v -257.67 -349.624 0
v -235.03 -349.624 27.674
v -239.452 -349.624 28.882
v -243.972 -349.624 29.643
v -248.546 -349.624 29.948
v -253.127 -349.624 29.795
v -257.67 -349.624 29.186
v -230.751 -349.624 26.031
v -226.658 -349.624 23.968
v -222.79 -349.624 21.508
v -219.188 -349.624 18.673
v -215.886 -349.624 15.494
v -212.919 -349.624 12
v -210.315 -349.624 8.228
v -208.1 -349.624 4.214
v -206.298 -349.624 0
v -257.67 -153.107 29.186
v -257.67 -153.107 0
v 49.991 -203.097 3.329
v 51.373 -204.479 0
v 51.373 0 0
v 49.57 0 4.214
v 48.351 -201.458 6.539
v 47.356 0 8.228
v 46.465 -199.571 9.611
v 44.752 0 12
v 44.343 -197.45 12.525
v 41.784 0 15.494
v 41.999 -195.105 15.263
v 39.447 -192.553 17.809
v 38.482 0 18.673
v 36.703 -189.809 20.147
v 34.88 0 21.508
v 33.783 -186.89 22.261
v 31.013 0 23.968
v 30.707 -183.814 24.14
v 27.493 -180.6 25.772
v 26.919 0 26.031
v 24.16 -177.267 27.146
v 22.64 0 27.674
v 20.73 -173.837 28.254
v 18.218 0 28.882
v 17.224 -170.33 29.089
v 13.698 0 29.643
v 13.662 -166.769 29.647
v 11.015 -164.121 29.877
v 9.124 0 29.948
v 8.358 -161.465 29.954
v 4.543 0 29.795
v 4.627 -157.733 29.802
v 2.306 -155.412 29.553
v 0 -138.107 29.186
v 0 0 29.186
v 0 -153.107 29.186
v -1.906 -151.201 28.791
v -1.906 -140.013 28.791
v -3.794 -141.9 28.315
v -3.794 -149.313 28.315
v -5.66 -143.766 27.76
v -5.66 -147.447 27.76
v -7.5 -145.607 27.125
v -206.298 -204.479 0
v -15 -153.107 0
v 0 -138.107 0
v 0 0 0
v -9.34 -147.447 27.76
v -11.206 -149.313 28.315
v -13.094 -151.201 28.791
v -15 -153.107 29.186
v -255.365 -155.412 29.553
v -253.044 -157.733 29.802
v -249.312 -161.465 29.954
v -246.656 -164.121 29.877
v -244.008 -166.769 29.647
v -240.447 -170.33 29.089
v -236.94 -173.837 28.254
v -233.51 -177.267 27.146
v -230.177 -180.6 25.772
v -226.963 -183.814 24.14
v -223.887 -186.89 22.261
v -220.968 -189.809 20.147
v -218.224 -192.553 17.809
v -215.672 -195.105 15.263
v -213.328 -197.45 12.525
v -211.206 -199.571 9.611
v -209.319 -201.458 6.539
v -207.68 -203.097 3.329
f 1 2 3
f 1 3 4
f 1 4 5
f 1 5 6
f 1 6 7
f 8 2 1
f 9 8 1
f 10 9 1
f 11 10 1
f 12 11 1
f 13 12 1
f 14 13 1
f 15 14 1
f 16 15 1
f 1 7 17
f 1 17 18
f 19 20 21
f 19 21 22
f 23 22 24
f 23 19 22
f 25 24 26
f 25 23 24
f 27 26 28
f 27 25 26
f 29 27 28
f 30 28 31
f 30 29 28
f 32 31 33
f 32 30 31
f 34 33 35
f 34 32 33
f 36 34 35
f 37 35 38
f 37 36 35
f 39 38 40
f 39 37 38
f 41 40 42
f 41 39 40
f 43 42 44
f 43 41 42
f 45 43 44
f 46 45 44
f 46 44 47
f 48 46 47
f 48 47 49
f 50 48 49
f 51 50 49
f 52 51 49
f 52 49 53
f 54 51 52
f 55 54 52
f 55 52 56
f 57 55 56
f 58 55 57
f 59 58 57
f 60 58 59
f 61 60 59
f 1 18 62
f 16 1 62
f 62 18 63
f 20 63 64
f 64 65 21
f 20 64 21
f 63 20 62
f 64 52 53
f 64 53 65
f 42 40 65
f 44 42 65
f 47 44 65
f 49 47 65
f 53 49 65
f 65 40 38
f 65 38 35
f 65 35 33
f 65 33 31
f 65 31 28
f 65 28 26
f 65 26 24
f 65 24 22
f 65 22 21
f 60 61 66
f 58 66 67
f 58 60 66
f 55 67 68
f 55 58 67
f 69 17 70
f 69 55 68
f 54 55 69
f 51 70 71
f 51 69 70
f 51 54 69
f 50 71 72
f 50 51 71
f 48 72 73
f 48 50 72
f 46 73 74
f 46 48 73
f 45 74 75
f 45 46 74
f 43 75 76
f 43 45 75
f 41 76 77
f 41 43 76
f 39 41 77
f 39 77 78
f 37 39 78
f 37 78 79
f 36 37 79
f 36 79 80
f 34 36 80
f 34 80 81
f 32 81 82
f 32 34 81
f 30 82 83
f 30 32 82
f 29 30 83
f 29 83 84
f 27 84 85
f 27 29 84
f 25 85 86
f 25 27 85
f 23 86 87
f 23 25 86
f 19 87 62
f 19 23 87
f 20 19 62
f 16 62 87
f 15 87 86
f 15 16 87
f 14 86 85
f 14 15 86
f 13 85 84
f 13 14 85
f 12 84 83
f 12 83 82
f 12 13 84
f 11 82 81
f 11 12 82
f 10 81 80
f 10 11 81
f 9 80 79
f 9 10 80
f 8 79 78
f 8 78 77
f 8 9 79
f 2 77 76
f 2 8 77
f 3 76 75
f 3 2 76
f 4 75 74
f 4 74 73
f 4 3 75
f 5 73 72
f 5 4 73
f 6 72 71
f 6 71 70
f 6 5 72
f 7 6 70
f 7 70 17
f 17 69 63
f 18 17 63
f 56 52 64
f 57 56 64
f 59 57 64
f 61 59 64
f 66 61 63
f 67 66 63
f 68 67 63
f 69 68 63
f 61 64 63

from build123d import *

# Parameters (mm, degrees)
F3_T4_DEPTH  = 67.761612304
F3_S5_R      = 45.861643493
F3_T6_DEPTH  = 37
F3_S7_R      = 45.861643493
F3_T8_DEPTH  = 37
F3_T12_DEPTH = 67.761612304
F3_S13_R     = 45.861643493
F3_T14_DEPTH = 37
F3_S15_R     = 45.861643493
F3_T16_DEPTH = 37
F3_T20_DEPTH = 67.761612304
F3_S21_R     = 45.861643493
F3_T22_DEPTH = 37
F3_S23_R     = 45.861643493
F3_T24_DEPTH = 37


# Not quite as in the source:
# - a fillet or chamfer that OpenCascade refuses, or shapes differently, is made with other operations: its cross-section is extruded or revolved along the edge and cut away or added


with BuildPart() as f2:
    # F2: sweep along a path in F1
    with BuildLine(Plane.XY) as f2_path:
        Line((0, 0), (0, -153.106674552))
        Line((0, -153.106674552), (-257.6704025269, -153.106674552))
        Line((-257.6704025269, -153.106674552), (-257.6704025269, -349.6235013008))
    # F0 (on Front) → F2 (sweep)
    with BuildSketch(Plane.XZ):
        with BuildLine():
            Line((0, 0), (44.372734969, 0))
            add(Edge.make_bspline(
                [(44.372734969, 0), (44.372734969, 22.1863674845), (0, 22.1863674845)],
                knots=[3.1415926536, 3.1415926536, 3.1415926536, 4.7123889804, 4.7123889804, 4.7123889804], degree=2, weights=[1, 0.7071067812, 1]))
            Line((0, 22.1863674845), (0, 0))
        make_face()
        with BuildLine():
            add(Edge.make_bspline(
                [(44.372734969, 0), (44.372734969, 22.1863674845), (0, 22.1863674845)],
                knots=[3.1415926536, 3.1415926536, 3.1415926536, 4.7123889804, 4.7123889804, 4.7123889804], degree=2, weights=[1, 0.7071067812, 1]))
            Line((44.372734969, 0), (51.372734969, 0))
            ThreePointArc((51.372734969, 0), (31.0126987208, 23.9683895846), (0, 29.1863674845))
            Line((0, 29.1863674845), (0, 22.1863674845))
        make_face()
    sweep(path=f2_path.line, transition=Transition.RIGHT)

    # F3: chamfer of 15 on 1 edges, made by hand


with BuildPart() as f3_tool2:
    # F3_s3 → F3_t4 (new body)
    with BuildSketch(Plane.XY):
        Polygon((0, -138.106674552), (-15, -153.106674552), (0, -153.106674552), align=None)
    extrude(amount=F3_T4_DEPTH)

    # F3_s5 → F3_t6 (intersect, symmetric)
    with BuildSketch(Plane.XZ.offset(145.6)):
        with Locations((8.3581917564, -15.9072127065)):
            Circle(F3_S5_R)
    extrude(amount=F3_T6_DEPTH, both=True, mode=Mode.INTERSECT)

    # F3_s7 → F3_t8 (intersect, symmetric)
    with BuildSketch(Plane.YZ.offset(-7.5)):
        with Locations((-161.4648663084, -15.9072127065)):
            Circle(F3_S7_R)
    extrude(amount=F3_T8_DEPTH, both=True, mode=Mode.INTERSECT)


with BuildPart() as f2_1:
    add(f2.part)

    # F3_t1: union F3_tool2
    add(f3_tool2.part)


with BuildPart() as f3_tool10:
    # F3_s11 → F3_t12 (new body)
    with BuildSketch(Plane.XY):
        Polygon((0, -138.106674552), (-15, -153.106674552), (0, -153.106674552), align=None)
    extrude(amount=F3_T12_DEPTH)

    # F3_s13 → F3_t14 (cut, symmetric)
    with BuildSketch(Plane.XZ.offset(145.6)):
        with Locations((8.3581917564, -15.9072127065)):
            Circle(F3_S13_R)
    extrude(amount=F3_T14_DEPTH, both=True, mode=Mode.SUBTRACT)

    # F3_s15 → F3_t16 (intersect, symmetric)
    with BuildSketch(Plane.YZ.offset(-7.5)):
        with Locations((-161.4648663084, -15.9072127065)):
            Circle(F3_S15_R)
    extrude(amount=F3_T16_DEPTH, both=True, mode=Mode.INTERSECT)


with BuildPart() as f2_2:
    add(f2_1.part)

    # F3_t9: union F3_tool10
    add(f3_tool10.part)


with BuildPart() as f3_tool18:
    # F3_s19 → F3_t20 (new body)
    with BuildSketch(Plane.XY):
        Polygon((0, -138.106674552), (-15, -153.106674552), (0, -153.106674552), align=None)
    extrude(amount=F3_T20_DEPTH)

    # F3_s21 → F3_t22 (intersect, symmetric)
    with BuildSketch(Plane.XZ.offset(145.6)):
        with Locations((8.3581917564, -15.9072127065)):
            Circle(F3_S21_R)
    extrude(amount=F3_T22_DEPTH, both=True, mode=Mode.INTERSECT)

    # F3_s23 → F3_t24 (cut, symmetric)
    with BuildSketch(Plane.YZ.offset(-7.5)):
        with Locations((-161.4648663084, -15.9072127065)):
            Circle(F3_S23_R)
    extrude(amount=F3_T24_DEPTH, both=True, mode=Mode.SUBTRACT)


with BuildPart() as f2_3:
    add(f2_2.part)

    # F3_t17: union F3_tool18
    add(f3_tool18.part)


solid = f2_3.part
